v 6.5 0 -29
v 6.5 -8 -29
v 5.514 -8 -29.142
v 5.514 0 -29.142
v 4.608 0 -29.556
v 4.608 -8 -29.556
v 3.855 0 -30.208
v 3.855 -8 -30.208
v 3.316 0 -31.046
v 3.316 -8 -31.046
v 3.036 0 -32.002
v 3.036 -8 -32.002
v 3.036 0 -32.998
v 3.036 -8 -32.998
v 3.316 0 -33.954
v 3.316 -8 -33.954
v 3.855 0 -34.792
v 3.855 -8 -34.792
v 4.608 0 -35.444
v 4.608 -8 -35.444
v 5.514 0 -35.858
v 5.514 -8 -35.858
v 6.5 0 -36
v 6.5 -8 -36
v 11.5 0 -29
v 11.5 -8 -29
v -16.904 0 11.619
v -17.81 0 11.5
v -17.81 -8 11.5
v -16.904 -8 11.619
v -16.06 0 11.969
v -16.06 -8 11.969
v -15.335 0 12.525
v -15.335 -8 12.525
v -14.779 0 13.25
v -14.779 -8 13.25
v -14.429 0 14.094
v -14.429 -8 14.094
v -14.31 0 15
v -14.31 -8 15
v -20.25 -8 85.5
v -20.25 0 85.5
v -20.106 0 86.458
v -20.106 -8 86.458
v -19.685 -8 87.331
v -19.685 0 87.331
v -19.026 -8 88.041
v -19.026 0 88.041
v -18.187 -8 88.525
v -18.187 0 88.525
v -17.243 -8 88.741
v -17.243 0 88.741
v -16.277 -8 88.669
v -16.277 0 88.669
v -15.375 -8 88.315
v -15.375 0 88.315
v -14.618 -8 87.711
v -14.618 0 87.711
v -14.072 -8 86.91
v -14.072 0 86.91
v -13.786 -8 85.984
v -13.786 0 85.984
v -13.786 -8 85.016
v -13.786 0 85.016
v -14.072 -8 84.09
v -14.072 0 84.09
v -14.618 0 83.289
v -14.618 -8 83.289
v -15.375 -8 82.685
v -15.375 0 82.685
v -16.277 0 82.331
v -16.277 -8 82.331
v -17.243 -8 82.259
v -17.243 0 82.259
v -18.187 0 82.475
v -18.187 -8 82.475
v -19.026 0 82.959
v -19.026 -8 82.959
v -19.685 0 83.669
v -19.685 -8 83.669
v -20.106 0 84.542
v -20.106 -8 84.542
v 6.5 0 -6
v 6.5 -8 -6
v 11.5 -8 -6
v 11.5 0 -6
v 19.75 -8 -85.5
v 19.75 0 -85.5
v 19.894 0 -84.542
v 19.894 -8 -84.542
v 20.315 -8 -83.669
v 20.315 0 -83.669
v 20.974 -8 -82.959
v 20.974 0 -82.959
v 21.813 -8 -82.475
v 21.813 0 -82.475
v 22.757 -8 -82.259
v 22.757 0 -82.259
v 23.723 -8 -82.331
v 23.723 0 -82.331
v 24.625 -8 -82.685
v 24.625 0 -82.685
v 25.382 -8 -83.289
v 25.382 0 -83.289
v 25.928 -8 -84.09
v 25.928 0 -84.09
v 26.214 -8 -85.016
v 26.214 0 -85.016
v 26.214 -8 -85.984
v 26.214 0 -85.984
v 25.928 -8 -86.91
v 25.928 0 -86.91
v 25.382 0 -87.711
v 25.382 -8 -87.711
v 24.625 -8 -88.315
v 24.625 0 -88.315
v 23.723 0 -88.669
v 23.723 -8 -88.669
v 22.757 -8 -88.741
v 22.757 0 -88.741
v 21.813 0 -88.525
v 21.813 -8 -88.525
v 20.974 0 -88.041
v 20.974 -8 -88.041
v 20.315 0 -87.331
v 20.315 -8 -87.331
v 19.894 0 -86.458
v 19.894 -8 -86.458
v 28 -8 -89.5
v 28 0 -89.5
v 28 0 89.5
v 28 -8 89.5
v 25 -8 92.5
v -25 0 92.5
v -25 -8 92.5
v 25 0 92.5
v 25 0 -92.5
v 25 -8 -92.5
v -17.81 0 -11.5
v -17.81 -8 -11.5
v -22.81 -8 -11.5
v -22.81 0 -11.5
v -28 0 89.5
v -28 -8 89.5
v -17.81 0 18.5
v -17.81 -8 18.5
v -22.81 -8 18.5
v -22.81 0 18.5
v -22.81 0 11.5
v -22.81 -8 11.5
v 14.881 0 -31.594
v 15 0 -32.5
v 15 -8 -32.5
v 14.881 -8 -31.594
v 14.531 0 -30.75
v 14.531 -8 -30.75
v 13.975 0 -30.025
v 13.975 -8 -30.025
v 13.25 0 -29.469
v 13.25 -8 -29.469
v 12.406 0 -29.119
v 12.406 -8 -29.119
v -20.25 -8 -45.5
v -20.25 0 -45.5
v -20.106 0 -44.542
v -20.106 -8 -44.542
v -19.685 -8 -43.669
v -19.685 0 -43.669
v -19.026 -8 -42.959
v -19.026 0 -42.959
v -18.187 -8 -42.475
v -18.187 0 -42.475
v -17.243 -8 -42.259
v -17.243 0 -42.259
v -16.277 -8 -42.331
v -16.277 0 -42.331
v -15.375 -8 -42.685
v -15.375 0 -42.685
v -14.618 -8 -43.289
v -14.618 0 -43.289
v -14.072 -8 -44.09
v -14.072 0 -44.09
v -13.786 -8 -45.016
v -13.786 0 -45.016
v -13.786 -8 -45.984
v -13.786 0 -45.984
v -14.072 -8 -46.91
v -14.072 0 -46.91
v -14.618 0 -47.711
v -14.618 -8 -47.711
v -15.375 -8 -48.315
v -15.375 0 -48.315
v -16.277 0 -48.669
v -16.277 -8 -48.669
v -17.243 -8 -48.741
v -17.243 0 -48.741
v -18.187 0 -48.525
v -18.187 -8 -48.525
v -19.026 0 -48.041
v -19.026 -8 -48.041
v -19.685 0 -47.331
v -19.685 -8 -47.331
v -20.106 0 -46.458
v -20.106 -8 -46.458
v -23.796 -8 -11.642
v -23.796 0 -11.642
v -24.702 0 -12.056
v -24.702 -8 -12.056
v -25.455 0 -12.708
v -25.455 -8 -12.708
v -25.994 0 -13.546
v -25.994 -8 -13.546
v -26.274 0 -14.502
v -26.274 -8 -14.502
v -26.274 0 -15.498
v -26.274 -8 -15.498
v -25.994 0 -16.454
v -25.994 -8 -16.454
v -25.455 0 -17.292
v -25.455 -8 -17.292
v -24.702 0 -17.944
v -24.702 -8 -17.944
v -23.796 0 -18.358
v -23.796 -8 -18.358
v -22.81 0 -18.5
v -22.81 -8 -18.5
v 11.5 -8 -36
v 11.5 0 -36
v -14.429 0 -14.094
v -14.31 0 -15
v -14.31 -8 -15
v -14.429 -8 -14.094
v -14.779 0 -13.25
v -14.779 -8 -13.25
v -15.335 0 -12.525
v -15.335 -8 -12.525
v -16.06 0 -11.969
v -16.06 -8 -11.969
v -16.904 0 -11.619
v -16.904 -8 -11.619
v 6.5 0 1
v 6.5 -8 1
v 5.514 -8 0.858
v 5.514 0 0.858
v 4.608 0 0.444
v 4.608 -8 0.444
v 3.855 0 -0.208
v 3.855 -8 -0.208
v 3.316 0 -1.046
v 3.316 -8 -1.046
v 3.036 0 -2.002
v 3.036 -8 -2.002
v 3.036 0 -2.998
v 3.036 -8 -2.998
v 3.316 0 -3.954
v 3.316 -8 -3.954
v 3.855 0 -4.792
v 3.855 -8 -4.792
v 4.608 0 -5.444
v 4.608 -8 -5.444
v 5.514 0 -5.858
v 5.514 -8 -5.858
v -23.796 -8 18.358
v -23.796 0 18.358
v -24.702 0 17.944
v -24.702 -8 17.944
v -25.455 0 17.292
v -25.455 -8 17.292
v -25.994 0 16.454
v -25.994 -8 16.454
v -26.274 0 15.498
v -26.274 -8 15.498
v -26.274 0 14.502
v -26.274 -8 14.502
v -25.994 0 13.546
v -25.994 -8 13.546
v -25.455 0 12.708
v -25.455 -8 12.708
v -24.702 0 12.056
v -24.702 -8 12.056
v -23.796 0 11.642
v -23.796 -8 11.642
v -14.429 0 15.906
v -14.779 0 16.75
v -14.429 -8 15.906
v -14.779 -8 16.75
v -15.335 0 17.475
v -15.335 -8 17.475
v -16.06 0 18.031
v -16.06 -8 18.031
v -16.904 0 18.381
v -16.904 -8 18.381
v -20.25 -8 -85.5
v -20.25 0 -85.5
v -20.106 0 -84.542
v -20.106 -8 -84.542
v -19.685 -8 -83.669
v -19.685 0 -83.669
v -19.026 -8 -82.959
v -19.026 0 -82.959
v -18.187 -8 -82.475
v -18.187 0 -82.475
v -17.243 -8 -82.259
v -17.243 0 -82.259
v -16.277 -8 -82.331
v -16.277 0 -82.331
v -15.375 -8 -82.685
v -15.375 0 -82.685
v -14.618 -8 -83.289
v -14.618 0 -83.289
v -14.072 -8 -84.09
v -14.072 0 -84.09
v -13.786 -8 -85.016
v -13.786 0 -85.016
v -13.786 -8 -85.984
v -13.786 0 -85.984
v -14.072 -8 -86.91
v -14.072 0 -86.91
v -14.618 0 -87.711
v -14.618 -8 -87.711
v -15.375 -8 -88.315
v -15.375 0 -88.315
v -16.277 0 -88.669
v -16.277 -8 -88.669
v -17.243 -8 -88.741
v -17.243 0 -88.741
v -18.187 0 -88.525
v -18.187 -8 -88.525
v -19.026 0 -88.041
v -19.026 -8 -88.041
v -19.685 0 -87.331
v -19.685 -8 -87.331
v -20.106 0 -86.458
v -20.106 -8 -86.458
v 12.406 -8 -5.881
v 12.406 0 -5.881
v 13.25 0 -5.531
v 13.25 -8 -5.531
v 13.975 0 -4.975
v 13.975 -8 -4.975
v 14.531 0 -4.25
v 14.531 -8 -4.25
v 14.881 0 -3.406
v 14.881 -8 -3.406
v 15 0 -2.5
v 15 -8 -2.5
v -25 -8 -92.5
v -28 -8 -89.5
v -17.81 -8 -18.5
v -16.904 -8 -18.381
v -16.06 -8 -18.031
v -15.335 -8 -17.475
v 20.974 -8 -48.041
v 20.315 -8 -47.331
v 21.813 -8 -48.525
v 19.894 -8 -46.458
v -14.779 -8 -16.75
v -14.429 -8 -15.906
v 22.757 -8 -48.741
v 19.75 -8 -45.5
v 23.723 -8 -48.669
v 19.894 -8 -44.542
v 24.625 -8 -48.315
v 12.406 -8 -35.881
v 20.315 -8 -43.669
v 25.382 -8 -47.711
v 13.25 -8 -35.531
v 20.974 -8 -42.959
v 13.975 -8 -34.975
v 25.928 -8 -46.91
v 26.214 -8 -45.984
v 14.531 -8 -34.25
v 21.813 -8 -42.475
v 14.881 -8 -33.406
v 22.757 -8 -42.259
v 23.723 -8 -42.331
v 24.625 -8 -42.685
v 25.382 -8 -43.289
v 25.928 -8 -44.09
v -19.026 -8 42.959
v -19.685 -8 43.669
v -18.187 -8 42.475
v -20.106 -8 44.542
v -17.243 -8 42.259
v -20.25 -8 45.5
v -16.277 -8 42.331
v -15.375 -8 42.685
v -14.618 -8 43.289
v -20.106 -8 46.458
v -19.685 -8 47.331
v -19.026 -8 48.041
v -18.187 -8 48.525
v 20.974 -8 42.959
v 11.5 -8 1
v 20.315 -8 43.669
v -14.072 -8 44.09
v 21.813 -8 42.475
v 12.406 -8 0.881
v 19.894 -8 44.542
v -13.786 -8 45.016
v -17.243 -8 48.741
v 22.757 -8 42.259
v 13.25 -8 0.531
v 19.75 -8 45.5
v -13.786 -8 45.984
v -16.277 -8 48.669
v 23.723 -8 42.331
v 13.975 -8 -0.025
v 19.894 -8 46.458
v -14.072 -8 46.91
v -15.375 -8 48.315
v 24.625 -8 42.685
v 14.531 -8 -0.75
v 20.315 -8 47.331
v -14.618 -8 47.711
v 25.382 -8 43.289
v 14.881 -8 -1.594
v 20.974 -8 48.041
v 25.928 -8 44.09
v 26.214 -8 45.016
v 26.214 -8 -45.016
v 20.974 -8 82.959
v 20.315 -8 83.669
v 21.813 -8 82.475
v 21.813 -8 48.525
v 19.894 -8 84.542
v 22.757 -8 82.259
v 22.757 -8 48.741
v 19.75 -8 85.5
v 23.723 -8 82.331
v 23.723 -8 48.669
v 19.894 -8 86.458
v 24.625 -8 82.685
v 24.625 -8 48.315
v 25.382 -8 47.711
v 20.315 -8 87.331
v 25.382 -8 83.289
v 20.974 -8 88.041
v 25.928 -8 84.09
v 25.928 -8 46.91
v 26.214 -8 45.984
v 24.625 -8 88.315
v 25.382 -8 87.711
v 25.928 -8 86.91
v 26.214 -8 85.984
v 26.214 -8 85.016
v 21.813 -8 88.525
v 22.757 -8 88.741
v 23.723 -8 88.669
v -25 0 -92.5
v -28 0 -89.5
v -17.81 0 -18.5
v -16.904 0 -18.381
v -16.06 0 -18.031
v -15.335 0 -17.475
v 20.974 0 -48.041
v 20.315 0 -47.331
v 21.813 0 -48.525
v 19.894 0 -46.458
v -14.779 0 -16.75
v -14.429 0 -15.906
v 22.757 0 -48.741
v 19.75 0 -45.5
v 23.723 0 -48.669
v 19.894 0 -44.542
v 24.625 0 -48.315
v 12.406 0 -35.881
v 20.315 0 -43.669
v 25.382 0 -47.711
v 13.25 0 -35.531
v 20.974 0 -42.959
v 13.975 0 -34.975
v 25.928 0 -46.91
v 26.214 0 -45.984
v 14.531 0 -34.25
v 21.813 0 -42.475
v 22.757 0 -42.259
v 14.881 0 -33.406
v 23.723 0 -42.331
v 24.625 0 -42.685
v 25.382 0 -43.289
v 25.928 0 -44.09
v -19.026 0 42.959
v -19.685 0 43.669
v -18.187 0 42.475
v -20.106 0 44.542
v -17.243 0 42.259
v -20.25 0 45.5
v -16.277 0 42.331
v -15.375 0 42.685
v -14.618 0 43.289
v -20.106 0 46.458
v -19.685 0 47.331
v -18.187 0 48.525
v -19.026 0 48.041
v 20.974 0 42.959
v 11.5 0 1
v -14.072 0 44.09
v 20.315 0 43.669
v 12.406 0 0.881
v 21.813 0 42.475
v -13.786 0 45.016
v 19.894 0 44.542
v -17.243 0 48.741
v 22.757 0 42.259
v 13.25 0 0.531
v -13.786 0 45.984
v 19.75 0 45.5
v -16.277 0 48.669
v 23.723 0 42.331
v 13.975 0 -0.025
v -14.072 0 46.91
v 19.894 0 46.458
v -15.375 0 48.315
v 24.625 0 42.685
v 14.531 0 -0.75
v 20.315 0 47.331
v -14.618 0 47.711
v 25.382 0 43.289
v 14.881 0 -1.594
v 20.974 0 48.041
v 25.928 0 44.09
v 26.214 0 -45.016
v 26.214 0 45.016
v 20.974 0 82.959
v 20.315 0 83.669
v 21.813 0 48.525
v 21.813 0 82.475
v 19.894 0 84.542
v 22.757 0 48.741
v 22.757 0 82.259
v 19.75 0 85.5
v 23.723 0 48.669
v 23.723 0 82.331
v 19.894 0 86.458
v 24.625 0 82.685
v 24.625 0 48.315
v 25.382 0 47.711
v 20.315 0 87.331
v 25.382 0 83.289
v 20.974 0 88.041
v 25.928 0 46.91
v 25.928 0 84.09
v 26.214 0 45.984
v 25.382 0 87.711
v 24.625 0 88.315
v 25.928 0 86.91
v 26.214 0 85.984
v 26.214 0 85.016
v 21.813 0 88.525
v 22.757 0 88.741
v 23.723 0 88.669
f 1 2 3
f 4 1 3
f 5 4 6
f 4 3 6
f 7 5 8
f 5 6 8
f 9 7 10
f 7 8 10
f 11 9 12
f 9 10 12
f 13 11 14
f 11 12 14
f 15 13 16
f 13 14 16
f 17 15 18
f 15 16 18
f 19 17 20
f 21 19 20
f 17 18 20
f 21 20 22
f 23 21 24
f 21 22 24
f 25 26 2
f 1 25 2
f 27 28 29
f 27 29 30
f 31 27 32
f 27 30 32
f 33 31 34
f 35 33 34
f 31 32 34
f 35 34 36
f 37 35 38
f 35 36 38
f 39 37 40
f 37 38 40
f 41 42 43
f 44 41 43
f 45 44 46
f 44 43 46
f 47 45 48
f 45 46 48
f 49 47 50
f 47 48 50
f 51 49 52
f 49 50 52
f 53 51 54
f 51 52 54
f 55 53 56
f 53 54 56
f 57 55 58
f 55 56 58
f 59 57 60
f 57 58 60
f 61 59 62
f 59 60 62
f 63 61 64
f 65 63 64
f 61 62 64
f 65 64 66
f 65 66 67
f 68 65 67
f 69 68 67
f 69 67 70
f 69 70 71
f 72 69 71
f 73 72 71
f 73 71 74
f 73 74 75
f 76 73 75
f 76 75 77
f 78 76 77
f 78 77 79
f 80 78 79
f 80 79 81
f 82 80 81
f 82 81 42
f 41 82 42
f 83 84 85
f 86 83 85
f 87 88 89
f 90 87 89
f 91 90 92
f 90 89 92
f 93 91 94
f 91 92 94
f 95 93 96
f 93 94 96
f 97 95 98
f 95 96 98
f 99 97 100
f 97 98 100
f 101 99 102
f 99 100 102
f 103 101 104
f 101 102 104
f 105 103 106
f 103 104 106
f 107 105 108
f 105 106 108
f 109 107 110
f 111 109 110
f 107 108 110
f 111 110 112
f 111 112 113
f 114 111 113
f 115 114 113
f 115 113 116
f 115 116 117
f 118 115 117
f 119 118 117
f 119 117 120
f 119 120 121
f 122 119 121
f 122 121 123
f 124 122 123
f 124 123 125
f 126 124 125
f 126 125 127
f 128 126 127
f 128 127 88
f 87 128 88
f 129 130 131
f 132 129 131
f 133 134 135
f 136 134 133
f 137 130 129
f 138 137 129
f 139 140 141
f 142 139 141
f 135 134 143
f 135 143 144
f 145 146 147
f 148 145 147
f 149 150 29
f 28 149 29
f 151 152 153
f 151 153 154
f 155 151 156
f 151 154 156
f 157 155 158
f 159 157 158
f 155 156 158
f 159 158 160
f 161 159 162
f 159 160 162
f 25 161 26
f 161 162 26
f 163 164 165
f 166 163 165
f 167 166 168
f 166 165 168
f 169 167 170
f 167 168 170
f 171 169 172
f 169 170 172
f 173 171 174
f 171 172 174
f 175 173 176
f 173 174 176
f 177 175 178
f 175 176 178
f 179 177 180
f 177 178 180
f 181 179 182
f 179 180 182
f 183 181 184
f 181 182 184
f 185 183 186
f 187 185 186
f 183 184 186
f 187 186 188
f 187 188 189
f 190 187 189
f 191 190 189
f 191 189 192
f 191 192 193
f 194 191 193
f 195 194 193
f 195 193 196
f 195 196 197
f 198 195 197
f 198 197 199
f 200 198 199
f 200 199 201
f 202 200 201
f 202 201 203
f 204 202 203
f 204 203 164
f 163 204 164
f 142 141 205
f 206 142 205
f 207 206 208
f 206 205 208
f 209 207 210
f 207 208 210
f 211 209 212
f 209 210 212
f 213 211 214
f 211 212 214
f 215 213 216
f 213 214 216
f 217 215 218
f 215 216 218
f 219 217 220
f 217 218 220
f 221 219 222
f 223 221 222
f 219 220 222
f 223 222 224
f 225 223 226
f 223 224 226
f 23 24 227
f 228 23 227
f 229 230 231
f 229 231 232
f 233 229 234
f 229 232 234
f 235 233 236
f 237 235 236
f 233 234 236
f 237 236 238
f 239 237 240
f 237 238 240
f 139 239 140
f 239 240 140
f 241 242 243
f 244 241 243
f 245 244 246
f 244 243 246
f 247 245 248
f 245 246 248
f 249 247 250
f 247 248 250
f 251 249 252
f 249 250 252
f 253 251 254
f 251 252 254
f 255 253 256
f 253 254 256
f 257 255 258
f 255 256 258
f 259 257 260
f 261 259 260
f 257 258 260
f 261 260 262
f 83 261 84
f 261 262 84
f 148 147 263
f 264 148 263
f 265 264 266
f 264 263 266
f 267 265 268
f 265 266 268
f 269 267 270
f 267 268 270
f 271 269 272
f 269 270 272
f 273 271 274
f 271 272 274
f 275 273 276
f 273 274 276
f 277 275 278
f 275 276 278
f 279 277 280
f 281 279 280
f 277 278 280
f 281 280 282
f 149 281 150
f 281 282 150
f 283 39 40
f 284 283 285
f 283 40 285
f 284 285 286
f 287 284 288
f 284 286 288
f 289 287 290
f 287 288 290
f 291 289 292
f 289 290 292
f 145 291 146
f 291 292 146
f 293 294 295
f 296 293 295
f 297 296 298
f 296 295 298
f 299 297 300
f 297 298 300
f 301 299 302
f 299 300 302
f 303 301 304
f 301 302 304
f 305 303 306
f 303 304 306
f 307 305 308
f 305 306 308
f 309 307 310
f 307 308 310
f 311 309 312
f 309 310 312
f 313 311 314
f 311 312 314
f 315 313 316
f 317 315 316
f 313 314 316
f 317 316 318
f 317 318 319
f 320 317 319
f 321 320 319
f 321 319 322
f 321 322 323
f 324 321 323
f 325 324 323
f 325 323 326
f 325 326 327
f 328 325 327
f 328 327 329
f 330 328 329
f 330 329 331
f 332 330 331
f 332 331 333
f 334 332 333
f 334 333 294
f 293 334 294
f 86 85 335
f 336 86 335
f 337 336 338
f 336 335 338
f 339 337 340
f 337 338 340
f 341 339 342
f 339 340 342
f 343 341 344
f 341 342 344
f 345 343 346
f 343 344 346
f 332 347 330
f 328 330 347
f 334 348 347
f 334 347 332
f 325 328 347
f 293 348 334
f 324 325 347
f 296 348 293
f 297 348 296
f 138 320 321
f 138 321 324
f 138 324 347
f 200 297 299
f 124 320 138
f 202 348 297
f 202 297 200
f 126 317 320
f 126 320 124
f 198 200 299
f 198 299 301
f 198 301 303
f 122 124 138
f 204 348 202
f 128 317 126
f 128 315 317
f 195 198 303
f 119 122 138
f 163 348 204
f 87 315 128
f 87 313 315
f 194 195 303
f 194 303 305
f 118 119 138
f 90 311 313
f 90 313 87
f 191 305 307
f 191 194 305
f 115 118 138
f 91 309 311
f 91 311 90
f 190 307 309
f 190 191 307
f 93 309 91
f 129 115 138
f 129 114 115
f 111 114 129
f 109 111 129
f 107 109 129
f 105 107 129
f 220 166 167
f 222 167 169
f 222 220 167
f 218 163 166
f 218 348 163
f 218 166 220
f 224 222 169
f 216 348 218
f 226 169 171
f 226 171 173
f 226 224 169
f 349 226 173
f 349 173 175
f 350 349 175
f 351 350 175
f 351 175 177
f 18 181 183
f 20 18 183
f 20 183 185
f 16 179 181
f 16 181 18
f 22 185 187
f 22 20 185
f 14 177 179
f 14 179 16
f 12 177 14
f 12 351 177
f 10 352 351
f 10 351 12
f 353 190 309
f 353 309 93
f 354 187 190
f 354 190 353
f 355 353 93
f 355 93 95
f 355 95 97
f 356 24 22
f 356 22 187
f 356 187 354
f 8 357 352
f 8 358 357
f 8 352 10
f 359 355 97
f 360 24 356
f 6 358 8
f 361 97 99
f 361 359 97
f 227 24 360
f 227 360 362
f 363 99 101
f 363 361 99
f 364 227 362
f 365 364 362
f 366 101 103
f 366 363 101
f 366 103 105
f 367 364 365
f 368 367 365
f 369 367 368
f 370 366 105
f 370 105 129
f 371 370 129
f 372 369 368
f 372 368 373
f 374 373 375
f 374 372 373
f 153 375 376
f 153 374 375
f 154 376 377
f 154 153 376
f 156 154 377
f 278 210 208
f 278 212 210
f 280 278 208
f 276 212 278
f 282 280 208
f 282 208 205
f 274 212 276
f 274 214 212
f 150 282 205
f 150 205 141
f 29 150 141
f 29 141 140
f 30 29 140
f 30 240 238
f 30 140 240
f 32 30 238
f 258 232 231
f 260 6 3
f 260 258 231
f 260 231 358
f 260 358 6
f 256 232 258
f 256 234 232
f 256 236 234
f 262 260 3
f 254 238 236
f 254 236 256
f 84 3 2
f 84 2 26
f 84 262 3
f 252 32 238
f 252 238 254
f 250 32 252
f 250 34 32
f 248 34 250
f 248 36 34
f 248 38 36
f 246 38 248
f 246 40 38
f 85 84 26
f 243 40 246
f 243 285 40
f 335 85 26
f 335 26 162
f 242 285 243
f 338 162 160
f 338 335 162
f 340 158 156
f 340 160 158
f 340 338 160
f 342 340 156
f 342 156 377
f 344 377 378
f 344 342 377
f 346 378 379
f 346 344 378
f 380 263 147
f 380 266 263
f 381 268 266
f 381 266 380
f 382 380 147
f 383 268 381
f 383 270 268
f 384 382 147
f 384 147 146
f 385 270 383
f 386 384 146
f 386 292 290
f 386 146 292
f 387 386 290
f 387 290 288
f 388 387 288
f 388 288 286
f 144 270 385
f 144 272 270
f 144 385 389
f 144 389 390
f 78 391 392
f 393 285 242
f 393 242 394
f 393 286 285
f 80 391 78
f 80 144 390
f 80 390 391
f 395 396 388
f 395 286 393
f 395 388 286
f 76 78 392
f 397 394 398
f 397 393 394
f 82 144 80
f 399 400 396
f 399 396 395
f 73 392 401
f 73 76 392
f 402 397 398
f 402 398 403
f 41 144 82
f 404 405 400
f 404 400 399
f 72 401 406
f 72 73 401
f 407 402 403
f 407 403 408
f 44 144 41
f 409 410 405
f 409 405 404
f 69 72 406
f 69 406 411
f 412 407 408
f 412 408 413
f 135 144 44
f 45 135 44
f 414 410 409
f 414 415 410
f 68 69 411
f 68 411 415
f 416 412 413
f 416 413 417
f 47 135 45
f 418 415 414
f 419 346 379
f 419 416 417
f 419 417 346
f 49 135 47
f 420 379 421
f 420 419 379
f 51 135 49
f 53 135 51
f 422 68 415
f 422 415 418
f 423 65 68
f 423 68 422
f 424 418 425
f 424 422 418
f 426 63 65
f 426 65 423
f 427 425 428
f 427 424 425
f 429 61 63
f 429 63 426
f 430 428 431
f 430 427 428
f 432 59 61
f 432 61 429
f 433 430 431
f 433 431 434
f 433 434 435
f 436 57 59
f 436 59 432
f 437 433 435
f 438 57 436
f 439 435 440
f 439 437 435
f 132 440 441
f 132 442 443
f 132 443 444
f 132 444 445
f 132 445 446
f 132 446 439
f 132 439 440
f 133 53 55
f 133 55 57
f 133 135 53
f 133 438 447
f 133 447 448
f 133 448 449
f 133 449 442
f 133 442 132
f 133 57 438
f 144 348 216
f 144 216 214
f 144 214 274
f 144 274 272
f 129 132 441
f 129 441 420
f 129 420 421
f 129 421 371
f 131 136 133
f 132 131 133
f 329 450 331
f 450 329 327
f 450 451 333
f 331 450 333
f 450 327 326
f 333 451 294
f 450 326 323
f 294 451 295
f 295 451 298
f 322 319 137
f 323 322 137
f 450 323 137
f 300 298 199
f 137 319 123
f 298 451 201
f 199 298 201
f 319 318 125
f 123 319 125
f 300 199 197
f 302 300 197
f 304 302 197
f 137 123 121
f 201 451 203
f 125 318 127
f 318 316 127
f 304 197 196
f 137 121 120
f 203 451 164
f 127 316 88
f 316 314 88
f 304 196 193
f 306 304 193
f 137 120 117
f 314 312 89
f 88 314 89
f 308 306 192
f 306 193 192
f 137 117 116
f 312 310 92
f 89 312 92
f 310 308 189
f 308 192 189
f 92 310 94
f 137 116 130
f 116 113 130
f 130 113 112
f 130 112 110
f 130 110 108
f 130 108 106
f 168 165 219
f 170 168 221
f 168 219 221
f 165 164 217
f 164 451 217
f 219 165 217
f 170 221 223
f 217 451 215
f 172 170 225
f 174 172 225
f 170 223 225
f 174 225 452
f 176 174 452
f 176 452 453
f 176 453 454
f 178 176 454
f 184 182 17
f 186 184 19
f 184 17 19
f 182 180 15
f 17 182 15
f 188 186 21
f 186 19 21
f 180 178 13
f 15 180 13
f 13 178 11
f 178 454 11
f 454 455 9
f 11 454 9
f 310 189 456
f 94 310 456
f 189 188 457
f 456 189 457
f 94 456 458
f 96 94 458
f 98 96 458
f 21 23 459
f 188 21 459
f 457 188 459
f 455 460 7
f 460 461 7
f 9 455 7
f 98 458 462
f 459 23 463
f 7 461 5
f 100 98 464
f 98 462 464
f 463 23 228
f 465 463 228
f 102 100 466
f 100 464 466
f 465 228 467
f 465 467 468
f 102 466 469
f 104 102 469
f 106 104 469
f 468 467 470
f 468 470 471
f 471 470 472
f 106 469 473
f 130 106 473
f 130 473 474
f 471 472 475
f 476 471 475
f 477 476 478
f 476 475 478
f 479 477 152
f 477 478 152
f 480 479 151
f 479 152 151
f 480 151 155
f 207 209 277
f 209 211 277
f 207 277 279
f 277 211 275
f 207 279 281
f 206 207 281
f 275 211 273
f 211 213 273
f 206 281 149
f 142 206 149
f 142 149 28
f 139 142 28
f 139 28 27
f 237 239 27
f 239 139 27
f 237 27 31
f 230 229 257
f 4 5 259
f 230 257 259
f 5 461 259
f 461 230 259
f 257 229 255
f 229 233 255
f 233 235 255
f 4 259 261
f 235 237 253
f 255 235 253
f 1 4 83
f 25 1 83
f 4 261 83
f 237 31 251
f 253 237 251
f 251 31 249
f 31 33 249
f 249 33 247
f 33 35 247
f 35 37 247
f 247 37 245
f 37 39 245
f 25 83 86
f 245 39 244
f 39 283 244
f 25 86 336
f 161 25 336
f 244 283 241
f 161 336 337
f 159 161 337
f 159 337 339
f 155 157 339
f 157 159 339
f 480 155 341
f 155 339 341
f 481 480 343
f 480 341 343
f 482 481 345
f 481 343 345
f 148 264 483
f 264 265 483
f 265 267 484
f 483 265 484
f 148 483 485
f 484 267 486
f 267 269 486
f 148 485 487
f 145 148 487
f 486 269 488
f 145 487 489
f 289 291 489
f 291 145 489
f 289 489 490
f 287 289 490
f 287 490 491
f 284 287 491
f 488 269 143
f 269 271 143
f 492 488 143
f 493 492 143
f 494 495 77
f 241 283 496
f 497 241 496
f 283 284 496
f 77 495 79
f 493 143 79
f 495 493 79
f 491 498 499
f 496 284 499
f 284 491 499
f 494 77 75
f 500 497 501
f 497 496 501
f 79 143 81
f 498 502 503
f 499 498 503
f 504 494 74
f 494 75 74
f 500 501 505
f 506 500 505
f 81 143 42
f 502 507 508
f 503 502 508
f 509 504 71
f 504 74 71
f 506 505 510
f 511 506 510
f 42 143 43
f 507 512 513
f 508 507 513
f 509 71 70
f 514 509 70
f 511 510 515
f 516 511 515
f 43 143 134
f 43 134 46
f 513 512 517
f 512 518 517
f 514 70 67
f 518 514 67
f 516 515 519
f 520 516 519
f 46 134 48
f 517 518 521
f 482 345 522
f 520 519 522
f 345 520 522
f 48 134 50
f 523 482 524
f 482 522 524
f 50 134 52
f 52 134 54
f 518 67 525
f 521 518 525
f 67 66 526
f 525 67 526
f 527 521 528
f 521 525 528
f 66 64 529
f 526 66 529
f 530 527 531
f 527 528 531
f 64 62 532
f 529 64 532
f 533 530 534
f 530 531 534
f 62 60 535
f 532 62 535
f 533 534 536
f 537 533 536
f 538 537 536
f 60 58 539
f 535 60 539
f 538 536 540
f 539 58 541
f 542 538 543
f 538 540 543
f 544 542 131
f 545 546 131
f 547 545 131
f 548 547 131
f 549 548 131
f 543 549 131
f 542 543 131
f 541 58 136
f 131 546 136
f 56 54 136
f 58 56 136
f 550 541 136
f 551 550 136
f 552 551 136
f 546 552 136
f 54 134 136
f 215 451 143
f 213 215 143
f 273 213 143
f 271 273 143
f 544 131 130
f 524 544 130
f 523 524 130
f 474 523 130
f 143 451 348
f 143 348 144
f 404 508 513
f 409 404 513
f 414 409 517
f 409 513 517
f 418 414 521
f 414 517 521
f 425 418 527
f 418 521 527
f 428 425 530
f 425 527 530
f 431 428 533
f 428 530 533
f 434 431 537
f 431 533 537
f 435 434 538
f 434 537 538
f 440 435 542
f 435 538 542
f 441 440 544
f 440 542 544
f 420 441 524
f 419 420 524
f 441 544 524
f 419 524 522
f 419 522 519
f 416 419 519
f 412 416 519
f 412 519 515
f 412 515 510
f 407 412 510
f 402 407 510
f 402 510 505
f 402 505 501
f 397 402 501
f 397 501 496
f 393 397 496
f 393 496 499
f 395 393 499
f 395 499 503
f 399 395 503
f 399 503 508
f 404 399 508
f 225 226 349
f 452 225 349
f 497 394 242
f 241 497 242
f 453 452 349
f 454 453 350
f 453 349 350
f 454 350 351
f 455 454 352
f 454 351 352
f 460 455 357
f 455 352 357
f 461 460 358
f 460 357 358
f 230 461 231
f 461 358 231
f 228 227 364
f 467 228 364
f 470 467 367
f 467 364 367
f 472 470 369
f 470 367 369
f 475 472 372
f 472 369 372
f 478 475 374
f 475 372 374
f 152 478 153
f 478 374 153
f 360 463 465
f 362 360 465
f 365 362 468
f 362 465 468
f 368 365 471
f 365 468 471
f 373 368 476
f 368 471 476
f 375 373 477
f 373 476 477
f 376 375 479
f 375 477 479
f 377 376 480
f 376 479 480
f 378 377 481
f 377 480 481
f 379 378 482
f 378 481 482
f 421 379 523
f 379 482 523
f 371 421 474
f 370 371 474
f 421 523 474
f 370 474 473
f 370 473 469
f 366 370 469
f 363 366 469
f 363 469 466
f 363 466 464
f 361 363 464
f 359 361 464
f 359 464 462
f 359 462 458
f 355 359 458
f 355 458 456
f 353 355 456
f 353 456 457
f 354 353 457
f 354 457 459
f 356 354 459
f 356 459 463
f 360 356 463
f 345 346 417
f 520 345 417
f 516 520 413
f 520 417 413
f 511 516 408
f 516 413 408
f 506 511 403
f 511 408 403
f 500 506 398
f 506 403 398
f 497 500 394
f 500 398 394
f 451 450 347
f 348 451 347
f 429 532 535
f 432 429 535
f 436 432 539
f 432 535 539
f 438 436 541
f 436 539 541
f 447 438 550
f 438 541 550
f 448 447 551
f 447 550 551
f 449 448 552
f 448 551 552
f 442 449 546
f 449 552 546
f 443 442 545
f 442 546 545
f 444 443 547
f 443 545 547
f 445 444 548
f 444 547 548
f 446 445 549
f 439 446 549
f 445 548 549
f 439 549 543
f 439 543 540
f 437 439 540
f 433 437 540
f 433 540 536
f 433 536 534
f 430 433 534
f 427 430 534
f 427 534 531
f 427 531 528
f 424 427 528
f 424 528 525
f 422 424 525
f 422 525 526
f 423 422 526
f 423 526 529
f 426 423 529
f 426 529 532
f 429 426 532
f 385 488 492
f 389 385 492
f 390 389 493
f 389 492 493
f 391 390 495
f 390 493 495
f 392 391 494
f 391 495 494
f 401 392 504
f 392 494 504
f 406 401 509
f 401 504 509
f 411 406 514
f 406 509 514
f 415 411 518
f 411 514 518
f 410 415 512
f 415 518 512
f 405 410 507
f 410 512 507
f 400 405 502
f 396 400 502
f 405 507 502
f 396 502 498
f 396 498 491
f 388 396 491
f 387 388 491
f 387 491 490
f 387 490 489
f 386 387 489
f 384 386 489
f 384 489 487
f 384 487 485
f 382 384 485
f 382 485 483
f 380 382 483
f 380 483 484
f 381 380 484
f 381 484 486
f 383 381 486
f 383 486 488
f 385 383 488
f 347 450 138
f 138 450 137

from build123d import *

# Parameters (mm, degrees)
F0_W     = 56
F0_H     = 185
F1_DEPTH = 8
F2_SIZE  = 3
F4_D     = 6.5
F6_DEPTH = 25


with BuildPart() as f1:
    # F0 (on Front) → F1 (new body)
    with BuildSketch(Plane.XZ):
        Rectangle(F0_W, F0_H)
    extrude(amount=F1_DEPTH)

    # F2
    f2_edges = [f1.edges().sort_by_distance(p)[0] for p in [
        (28, -4, 92.5),
        (-28, -4, 92.5),
        (28, -4, -92.5),
        (-28, -4, -92.5),
    ]]
    chamfer(f2_edges, length=F2_SIZE)

    # F4 (through all)
    with Locations(Plane.XZ.offset(8)):
        with Locations((-17, -85.5), (23, -85.5), (23, -45.5), (-17, -45.5), (-17, 45.5), (23, 45.5), (23, 85.5), (-17, 85.5)):
            Hole(F4_D / 2)

    # F5 (on face) → F6 (cut)
    with BuildSketch(Plane.XZ.offset(8)):
        with BuildLine():
            ThreePointArc((6.5, 1), (3, -2.5), (6.5, -6))
            Line((6.5, -6), (6.5, 1))
        make_face()
        with BuildLine():
            Line((11.5, 1), (11.5, -6))
            ThreePointArc((11.5, -6), (13.9748737342, -4.9748737342), (15, -2.5))
            ThreePointArc((15, -2.5), (13.9748737342, -0.0251262658), (11.5, 1))
        make_face()
        with BuildLine():
            ThreePointArc((6.5, -29), (3, -32.5), (6.5, -36))
            Line((6.5, -36), (6.5, -29))
        make_face()
        with BuildLine():
            Line((11.5, -29), (11.5, -36))
            ThreePointArc((11.5, -36), (13.9748737342, -34.9748737342), (15, -32.5))
            ThreePointArc((15, -32.5), (13.9748737342, -30.0251262658), (11.5, -29))
        make_face()
        with BuildLine():
            Line((-17.81, -11.5), (-17.81, -18.5))
            ThreePointArc((-17.81, -18.5), (-15.3351262658, -17.4748737342), (-14.31, -15))
            ThreePointArc((-14.31, -15), (-15.3351262658, -12.5251262658), (-17.81, -11.5))
        make_face()
        with BuildLine():
            ThreePointArc((-22.81, 18.5), (-26.31, 15), (-22.81, 11.5))
            Line((-22.81, 11.5), (-22.81, 18.5))
        make_face()
        with BuildLine():
            Line((-17.81, 18.5), (-17.81, 11.5))
            ThreePointArc((-17.81, 11.5), (-15.3351262658, 12.5251262658), (-14.31, 15))
            ThreePointArc((-14.31, 15), (-15.3351262658, 17.4748737342), (-17.81, 18.5))
        make_face()
        with BuildLine():
            ThreePointArc((9, -4.9494897428), (7.8558735008, -5.7267021942), (6.5, -6))
            Line((6.5, -6), (11.5, -6))
            ThreePointArc((11.5, -6), (10.1441264992, -5.7267021942), (9, -4.9494897428))
        make_face()
        with BuildLine():
            Line((11.5, 1), (6.5, 1))
            ThreePointArc((6.5, 1), (7.8558735008, 0.7267021942), (9, -0.0505102572))
            ThreePointArc((9, -0.0505102572), (10.1441264992, 0.7267021942), (11.5, 1))
        make_face()
        with BuildLine():
            ThreePointArc((9, -34.9494897428), (7.8558735008, -35.7267021942), (6.5, -36))
            Line((6.5, -36), (11.5, -36))
            ThreePointArc((11.5, -36), (10.1441264992, -35.7267021942), (9, -34.9494897428))
        make_face()
        with BuildLine():
            Line((11.5, -29), (6.5, -29))
            ThreePointArc((6.5, -29), (7.8558735008, -29.2732978058), (9, -30.0505102572))
            ThreePointArc((9, -30.0505102572), (10.1441264992, -29.2732978058), (11.5, -29))
        make_face()
        with BuildLine():
            ThreePointArc((-20.31, -17.4494897428), (-21.4541264992, -18.2267021942), (-22.81, -18.5))
            Line((-22.81, -18.5), (-17.81, -18.5))
            ThreePointArc((-17.81, -18.5), (-19.1658735008, -18.2267021942), (-20.31, -17.4494897428))
        make_face()
        with BuildLine():
            Line((-17.81, -11.5), (-22.81, -11.5))
            ThreePointArc((-22.81, -11.5), (-21.4541264992, -11.7732978058), (-20.31, -12.5505102572))
            ThreePointArc((-20.31, -12.5505102572), (-19.1658735008, -11.7732978058), (-17.81, -11.5))
        make_face()
        with BuildLine():
            ThreePointArc((-20.31, 12.5505102572), (-21.4541264992, 11.7732978058), (-22.81, 11.5))
            Line((-22.81, 11.5), (-17.81, 11.5))
            ThreePointArc((-17.81, 11.5), (-19.1658735008, 11.7732978058), (-20.31, 12.5505102572))
        make_face()
        with BuildLine():
            Line((-17.81, 18.5), (-22.81, 18.5))
            ThreePointArc((-22.81, 18.5), (-21.4541264992, 18.2267021942), (-20.31, 17.4494897428))
            ThreePointArc((-20.31, 17.4494897428), (-19.1658735008, 18.2267021942), (-17.81, 18.5))
        make_face()
        with BuildLine():
            Line((6.5, 1), (6.5, -6))
            ThreePointArc((6.5, -6), (7.8558735008, -5.7267021942), (9, -4.9494897428))
            ThreePointArc((9, -4.9494897428), (8, -2.5), (9, -0.0505102572))
            ThreePointArc((9, -0.0505102572), (7.8558735008, 0.7267021942), (6.5, 1))
        make_face()
        with BuildLine():
            ThreePointArc((9, -4.9494897428), (10.1441264992, -5.7267021942), (11.5, -6))
            Line((11.5, -6), (11.5, 1))
            ThreePointArc((11.5, 1), (10.1441264992, 0.7267021942), (9, -0.0505102572))
            ThreePointArc((9, -0.0505102572), (9.7403703492, -1.1771243445), (10, -2.5))
            ThreePointArc((10, -2.5), (9.7403703492, -3.8228756555), (9, -4.9494897428))
        make_face()
        with BuildLine():
            Line((6.5, -29), (6.5, -36))
            ThreePointArc((6.5, -36), (7.8558735008, -35.7267021942), (9, -34.9494897428))
            ThreePointArc((9, -34.9494897428), (8, -32.5), (9, -30.0505102572))
            ThreePointArc((9, -30.0505102572), (7.8558735008, -29.2732978058), (6.5, -29))
        make_face()
        with BuildLine():
            ThreePointArc((9, -34.9494897428), (10.1441264992, -35.7267021942), (11.5, -36))
            Line((11.5, -36), (11.5, -29))
            ThreePointArc((11.5, -29), (10.1441264992, -29.2732978058), (9, -30.0505102572))
            ThreePointArc((9, -30.0505102572), (9.7403703492, -31.1771243445), (10, -32.5))
            ThreePointArc((10, -32.5), (9.7403703492, -33.8228756555), (9, -34.9494897428))
        make_face()
        with BuildLine():
            Line((-22.81, -11.5), (-22.81, -18.5))
            ThreePointArc((-22.81, -18.5), (-21.4541264992, -18.2267021942), (-20.31, -17.4494897428))
            ThreePointArc((-20.31, -17.4494897428), (-21.31, -15), (-20.31, -12.5505102572))
            ThreePointArc((-20.31, -12.5505102572), (-21.4541264992, -11.7732978058), (-22.81, -11.5))
        make_face()
        with BuildLine():
            ThreePointArc((-20.31, -17.4494897428), (-19.1658735008, -18.2267021942), (-17.81, -18.5))
            Line((-17.81, -18.5), (-17.81, -11.5))
            ThreePointArc((-17.81, -11.5), (-19.1658735008, -11.7732978058), (-20.31, -12.5505102572))
            ThreePointArc((-20.31, -12.5505102572), (-19.5696296508, -13.6771243445), (-19.31, -15))
            ThreePointArc((-19.31, -15), (-19.5696296508, -16.3228756555), (-20.31, -17.4494897428))
        make_face()
        with BuildLine():
            Line((-22.81, 18.5), (-22.81, 11.5))
            ThreePointArc((-22.81, 11.5), (-21.4541264992, 11.7732978058), (-20.31, 12.5505102572))
            ThreePointArc((-20.31, 12.5505102572), (-21.31, 15), (-20.31, 17.4494897428))
            ThreePointArc((-20.31, 17.4494897428), (-21.4541264992, 18.2267021942), (-22.81, 18.5))
        make_face()
        with BuildLine():
            ThreePointArc((-20.31, 12.5505102572), (-19.1658735008, 11.7732978058), (-17.81, 11.5))
            Line((-17.81, 11.5), (-17.81, 18.5))
            ThreePointArc((-17.81, 18.5), (-19.1658735008, 18.2267021942), (-20.31, 17.4494897428))
            ThreePointArc((-20.31, 17.4494897428), (-19.5696296508, 16.3228756555), (-19.31, 15))
            ThreePointArc((-19.31, 15), (-19.5696296508, 13.6771243445), (-20.31, 12.5505102572))
        make_face()
        with BuildLine():
            ThreePointArc((-22.81, -11.5), (-26.31, -15), (-22.81, -18.5))
            Line((-22.81, -18.5), (-22.81, -11.5))
        make_face()
        with BuildLine():
            ThreePointArc((-20.31, -12.5505102572), (-21.31, -15), (-20.31, -17.4494897428))
            ThreePointArc((-20.31, -17.4494897428), (-19.5696296508, -16.3228756555), (-19.31, -15))
            ThreePointArc((-19.31, -15), (-19.5696296508, -13.6771243445), (-20.31, -12.5505102572))
        make_face()
        with BuildLine():
            ThreePointArc((-20.31, 17.4494897428), (-21.31, 15), (-20.31, 12.5505102572))
            ThreePointArc((-20.31, 12.5505102572), (-19.5696296508, 13.6771243445), (-19.31, 15))
            ThreePointArc((-19.31, 15), (-19.5696296508, 16.3228756555), (-20.31, 17.4494897428))
        make_face()
        with BuildLine():
            ThreePointArc((9, -0.0505102572), (8, -2.5), (9, -4.9494897428))
            ThreePointArc((9, -4.9494897428), (9.7403703492, -3.8228756555), (10, -2.5))
            ThreePointArc((10, -2.5), (9.7403703492, -1.1771243445), (9, -0.0505102572))
        make_face()
        with BuildLine():
            ThreePointArc((9, -30.0505102572), (8, -32.5), (9, -34.9494897428))
            ThreePointArc((9, -34.9494897428), (9.7403703492, -33.8228756555), (10, -32.5))
            ThreePointArc((10, -32.5), (9.7403703492, -31.1771243445), (9, -30.0505102572))
        make_face()
    extrude(amount=-F6_DEPTH, mode=Mode.SUBTRACT)


solid = f1.part
